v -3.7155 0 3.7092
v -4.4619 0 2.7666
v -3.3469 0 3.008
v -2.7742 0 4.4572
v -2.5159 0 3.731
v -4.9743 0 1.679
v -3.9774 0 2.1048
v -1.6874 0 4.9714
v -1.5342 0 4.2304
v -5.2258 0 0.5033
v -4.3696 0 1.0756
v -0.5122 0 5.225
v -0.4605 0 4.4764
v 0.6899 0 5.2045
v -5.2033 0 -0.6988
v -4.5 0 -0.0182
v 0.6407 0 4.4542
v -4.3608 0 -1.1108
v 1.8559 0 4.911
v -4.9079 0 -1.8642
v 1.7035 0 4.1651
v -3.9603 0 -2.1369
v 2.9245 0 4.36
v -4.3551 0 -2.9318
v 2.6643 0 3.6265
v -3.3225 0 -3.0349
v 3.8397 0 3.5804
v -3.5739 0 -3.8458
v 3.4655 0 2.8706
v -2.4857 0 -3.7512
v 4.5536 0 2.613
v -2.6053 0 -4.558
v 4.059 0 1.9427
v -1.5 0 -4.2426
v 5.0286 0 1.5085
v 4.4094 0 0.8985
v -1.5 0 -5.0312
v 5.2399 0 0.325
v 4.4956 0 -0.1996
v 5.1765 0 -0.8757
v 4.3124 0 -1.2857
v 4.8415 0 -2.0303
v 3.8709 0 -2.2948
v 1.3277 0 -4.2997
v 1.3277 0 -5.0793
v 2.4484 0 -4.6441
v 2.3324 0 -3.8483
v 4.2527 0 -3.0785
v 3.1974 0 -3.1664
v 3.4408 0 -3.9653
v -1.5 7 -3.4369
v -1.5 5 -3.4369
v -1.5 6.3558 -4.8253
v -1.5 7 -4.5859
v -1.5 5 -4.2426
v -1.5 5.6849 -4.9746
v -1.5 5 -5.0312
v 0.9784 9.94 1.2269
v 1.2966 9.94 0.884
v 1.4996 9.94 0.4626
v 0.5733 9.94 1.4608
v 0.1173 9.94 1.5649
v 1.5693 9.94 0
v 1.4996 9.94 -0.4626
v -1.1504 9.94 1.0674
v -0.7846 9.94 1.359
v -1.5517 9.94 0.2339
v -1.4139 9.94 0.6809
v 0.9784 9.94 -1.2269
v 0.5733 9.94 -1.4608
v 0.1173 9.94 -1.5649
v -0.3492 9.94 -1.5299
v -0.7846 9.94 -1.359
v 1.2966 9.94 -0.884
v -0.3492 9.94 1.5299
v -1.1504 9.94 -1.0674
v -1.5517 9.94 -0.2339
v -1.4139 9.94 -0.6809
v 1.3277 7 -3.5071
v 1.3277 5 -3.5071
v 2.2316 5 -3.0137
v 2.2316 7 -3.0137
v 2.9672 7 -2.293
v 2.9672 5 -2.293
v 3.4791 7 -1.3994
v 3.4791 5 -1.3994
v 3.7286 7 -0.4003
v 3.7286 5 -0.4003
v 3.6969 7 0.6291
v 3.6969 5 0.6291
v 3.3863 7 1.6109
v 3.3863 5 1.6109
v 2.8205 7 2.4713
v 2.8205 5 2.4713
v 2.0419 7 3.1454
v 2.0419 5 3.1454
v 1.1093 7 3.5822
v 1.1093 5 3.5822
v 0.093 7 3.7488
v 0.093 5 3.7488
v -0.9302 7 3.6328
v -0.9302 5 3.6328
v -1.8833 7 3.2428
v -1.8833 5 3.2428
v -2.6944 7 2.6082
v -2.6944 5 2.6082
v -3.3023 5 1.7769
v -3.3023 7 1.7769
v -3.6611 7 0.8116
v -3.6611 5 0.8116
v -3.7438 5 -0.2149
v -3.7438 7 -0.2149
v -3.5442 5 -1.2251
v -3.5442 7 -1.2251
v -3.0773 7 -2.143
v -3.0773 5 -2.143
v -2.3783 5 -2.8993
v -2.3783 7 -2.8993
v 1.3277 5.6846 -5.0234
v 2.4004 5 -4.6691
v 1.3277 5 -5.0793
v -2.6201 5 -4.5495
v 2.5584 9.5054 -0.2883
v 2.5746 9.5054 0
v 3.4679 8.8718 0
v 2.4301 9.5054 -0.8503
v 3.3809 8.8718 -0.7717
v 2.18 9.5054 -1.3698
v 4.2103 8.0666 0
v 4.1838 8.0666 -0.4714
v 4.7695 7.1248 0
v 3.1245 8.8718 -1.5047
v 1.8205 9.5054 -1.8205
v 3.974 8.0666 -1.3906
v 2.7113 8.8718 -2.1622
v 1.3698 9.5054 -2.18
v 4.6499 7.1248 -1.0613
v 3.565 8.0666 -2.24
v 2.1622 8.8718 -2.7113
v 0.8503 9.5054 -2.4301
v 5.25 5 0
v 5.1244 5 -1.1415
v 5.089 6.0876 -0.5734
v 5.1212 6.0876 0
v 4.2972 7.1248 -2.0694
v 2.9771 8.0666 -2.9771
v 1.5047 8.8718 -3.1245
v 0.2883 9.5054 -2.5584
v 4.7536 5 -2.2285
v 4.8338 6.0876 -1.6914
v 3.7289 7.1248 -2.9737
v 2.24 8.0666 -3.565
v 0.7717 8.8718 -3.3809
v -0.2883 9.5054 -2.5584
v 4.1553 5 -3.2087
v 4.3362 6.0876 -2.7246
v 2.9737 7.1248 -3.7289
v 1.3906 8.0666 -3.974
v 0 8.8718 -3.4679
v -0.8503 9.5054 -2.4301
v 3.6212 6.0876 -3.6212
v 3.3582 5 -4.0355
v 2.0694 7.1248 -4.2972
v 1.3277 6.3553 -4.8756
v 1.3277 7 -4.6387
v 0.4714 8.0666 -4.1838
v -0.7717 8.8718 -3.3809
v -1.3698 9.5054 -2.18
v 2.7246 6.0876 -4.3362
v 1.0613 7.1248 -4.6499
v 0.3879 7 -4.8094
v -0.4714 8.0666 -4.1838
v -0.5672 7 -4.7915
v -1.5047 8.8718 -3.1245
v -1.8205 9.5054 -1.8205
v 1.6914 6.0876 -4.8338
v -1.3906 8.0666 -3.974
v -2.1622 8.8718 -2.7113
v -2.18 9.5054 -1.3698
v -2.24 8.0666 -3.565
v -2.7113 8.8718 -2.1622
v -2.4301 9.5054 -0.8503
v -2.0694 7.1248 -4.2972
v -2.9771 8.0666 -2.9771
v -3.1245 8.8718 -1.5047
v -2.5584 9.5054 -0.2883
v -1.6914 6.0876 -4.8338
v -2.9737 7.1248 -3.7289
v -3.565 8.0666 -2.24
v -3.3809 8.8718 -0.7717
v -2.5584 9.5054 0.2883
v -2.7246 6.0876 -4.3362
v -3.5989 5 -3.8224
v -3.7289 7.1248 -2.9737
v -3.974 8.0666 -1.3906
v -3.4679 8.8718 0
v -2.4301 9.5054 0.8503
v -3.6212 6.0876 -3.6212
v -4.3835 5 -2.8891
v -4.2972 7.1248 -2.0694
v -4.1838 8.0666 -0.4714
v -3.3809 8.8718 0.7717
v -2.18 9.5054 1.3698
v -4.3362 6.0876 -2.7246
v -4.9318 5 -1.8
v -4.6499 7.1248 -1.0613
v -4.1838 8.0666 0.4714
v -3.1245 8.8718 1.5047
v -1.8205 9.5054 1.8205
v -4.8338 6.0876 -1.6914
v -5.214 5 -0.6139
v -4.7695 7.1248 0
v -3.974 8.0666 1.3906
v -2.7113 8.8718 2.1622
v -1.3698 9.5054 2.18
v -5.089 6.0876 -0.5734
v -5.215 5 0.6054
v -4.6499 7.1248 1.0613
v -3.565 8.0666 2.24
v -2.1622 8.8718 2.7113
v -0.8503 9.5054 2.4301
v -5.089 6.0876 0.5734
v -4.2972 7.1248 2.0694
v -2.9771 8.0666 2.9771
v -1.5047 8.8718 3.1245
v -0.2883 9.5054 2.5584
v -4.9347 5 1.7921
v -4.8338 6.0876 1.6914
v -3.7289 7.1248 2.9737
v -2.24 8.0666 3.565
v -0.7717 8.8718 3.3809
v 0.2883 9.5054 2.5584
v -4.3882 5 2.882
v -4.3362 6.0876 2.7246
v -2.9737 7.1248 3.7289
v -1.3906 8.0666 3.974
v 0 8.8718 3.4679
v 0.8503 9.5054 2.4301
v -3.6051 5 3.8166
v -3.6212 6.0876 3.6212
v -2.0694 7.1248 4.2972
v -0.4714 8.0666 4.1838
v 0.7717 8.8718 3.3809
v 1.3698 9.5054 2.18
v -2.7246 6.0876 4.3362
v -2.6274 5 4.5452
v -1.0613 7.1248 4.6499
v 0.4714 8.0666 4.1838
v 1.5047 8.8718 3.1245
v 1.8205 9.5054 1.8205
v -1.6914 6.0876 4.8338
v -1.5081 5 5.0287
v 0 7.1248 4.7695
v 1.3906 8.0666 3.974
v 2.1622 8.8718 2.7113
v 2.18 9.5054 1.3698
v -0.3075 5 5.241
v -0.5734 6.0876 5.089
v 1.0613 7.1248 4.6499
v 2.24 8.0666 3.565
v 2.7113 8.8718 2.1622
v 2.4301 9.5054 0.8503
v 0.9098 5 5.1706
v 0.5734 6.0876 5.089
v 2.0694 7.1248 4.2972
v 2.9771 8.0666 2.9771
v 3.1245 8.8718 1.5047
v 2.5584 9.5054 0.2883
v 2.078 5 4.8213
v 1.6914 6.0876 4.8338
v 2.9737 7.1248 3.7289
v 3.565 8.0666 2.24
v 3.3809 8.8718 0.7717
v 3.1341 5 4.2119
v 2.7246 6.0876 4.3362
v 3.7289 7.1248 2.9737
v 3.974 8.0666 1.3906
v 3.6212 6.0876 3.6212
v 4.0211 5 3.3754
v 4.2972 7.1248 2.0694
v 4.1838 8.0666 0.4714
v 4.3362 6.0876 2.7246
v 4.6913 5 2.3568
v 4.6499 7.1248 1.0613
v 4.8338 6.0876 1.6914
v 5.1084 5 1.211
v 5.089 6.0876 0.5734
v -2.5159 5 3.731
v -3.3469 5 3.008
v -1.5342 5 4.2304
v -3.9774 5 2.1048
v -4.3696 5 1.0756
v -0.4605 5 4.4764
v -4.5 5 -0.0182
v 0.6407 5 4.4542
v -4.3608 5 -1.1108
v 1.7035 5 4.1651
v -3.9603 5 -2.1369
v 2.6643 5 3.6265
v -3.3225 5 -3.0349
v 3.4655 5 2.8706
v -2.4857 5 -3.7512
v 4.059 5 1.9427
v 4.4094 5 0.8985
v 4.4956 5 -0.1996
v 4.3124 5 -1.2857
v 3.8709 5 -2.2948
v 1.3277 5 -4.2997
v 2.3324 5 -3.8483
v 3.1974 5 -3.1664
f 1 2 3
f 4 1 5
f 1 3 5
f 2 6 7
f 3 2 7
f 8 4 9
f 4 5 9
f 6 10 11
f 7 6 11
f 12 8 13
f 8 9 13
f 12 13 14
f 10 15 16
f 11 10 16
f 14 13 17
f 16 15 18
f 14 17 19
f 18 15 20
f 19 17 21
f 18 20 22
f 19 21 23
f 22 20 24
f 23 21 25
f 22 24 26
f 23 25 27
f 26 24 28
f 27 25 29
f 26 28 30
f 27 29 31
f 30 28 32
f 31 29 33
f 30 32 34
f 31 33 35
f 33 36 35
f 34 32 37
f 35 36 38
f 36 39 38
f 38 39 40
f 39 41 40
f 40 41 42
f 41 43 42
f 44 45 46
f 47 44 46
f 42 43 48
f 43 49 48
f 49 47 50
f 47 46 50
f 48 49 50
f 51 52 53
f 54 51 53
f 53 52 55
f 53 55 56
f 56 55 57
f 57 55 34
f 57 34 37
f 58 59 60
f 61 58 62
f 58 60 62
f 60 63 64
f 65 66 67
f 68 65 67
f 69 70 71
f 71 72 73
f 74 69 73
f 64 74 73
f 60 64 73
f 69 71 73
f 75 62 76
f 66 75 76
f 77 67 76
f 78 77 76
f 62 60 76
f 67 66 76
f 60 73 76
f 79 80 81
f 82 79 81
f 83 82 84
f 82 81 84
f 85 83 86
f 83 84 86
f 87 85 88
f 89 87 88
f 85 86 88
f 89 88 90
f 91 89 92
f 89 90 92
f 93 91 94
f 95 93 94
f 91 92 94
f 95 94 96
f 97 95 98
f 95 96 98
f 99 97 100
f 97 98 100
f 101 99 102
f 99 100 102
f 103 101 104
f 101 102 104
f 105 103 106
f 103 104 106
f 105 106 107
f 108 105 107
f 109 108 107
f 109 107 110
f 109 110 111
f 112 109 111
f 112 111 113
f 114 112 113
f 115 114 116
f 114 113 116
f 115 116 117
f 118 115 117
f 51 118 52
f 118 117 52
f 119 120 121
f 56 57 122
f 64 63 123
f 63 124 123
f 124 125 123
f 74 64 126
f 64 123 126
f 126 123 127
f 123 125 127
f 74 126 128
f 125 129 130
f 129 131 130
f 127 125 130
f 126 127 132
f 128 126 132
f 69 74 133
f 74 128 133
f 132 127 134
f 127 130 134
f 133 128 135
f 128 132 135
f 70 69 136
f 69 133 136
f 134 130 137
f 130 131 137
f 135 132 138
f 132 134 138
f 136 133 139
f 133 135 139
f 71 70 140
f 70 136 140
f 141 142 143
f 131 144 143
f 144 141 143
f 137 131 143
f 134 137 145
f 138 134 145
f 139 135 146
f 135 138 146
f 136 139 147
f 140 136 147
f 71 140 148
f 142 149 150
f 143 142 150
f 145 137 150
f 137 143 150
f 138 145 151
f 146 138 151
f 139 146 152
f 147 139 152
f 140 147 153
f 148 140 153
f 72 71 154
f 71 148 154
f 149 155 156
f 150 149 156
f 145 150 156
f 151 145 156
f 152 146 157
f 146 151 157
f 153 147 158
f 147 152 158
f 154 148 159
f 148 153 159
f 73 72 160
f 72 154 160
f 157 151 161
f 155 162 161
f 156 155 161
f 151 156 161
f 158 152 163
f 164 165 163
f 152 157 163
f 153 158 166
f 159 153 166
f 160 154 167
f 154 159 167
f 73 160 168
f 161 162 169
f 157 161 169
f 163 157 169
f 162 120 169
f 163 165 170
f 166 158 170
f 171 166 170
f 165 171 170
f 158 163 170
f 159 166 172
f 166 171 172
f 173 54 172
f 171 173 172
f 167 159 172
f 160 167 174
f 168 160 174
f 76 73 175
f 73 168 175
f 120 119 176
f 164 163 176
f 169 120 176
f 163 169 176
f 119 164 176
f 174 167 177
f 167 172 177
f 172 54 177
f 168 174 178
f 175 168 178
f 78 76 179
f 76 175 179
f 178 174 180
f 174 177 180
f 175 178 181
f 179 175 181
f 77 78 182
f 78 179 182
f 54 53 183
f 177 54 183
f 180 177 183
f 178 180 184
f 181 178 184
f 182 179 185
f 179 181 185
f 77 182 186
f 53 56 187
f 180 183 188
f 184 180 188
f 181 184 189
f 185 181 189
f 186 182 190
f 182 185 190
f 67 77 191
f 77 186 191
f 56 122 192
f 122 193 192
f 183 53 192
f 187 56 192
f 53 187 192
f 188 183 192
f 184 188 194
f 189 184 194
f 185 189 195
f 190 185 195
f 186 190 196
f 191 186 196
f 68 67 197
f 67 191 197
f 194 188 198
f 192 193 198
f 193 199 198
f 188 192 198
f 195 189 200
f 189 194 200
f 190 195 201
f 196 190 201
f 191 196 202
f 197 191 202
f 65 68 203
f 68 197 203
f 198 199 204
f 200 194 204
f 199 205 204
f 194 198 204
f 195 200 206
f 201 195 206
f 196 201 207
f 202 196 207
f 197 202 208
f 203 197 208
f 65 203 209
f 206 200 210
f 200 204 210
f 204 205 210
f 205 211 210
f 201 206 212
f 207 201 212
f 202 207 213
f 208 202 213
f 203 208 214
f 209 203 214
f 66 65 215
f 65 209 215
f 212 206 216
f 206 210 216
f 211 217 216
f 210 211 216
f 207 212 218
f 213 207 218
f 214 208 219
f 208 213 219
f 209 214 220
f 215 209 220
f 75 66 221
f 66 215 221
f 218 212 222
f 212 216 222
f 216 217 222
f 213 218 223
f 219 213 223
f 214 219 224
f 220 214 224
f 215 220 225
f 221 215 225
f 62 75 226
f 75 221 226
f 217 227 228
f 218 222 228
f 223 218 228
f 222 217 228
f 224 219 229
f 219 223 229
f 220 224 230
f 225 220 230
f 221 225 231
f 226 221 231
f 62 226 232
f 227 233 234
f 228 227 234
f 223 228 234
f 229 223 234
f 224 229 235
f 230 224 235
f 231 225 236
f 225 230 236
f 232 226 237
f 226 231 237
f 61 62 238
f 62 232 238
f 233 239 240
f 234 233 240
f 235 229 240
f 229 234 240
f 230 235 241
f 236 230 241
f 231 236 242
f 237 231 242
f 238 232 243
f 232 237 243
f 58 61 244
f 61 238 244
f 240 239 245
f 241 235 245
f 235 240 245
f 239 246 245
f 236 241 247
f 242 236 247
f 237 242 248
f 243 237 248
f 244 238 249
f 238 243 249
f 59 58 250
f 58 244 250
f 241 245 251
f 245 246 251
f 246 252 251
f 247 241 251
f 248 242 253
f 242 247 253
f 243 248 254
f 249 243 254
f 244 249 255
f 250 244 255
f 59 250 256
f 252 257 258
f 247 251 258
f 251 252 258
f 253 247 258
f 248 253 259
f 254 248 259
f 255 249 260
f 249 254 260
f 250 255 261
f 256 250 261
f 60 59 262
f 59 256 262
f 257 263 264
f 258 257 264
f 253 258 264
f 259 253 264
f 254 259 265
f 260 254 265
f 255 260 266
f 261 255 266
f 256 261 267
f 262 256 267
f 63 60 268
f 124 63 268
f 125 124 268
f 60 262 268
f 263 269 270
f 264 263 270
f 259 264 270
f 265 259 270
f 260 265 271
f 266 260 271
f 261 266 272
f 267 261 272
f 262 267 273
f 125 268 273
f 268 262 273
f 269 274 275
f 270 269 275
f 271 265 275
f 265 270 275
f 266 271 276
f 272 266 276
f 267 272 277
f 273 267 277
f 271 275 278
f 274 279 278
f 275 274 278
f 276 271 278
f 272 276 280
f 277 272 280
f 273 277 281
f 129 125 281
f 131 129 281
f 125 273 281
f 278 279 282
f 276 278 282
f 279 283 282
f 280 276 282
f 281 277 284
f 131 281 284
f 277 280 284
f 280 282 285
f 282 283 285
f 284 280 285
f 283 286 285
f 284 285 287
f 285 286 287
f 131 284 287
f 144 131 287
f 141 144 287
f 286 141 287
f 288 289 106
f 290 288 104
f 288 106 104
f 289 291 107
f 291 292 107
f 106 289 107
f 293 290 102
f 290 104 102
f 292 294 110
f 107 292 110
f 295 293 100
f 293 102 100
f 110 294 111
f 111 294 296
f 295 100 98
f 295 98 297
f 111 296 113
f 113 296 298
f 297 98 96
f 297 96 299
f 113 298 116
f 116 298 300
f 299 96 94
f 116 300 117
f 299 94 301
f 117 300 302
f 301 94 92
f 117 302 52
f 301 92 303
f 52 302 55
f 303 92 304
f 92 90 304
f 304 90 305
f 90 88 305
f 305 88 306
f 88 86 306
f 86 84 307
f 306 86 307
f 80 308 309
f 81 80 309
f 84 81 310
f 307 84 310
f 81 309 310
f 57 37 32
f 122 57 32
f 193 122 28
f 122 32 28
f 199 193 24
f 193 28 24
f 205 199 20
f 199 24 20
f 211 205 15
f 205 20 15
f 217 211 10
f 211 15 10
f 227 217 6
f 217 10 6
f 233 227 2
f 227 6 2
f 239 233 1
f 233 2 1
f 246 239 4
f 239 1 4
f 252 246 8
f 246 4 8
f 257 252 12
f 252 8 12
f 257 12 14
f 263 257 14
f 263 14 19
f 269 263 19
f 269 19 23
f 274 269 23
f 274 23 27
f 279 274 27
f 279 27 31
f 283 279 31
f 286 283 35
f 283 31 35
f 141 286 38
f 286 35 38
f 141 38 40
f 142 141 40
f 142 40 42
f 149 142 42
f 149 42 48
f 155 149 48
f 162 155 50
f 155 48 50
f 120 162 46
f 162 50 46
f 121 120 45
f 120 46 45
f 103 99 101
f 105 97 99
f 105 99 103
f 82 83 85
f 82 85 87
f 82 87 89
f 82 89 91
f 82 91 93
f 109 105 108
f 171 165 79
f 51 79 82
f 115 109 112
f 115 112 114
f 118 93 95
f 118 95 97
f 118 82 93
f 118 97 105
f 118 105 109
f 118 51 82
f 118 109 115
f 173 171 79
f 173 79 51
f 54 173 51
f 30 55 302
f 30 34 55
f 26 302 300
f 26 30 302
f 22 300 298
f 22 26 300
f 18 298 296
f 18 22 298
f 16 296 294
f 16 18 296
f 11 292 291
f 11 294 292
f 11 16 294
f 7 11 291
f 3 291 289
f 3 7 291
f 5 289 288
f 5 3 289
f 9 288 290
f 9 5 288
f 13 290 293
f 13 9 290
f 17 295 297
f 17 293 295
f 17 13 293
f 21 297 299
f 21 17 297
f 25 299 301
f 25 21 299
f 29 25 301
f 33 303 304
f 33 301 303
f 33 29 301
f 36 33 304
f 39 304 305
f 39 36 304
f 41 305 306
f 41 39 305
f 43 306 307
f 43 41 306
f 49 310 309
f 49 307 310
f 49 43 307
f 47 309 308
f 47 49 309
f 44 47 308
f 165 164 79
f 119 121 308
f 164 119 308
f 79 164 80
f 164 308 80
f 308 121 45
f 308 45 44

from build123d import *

# Parameters (mm, degrees)
SKETCH1_R           = 5.25
SKETCH1_R_2         = 4.5
BOSS_EXTRUDE1_DEPTH = 5
CUT_EXTRUDE1_DEPTH  = 5
CUT_EXTRUDE2_DEPTH  = 2
SKETCH6_R           = 2
CUT_EXTRUDE4_DEPTH  = 0.35


with BuildPart() as part:
    # Sketch1 → Boss-Extrude1 (new body)
    with BuildSketch(Plane(origin=(0, 0, 0), x_dir=(1, 0, 0), z_dir=(0, 1, 0))):
        Circle(SKETCH1_R)
        Circle(SKETCH1_R_2, mode=Mode.SUBTRACT)
    extrude(amount=BOSS_EXTRUDE1_DEPTH)

    # Sketch2 → Cut-Extrude1 (cut)
    with BuildSketch(Plane(origin=(0, 0, 0), x_dir=(1, 0, 0), z_dir=(0, 1, 0))):
        Polygon((1.327689147, 3.795637322), (1.327689147, 5.701107087), (-1.5, 5.701107087), (-1.5, 3.701107087), align=None)
    extrude(amount=CUT_EXTRUDE1_DEPTH, mode=Mode.SUBTRACT)

    # Sketch4 → Revolve1 (revolve)
    with BuildSketch(Plane.XY):
        with BuildLine():
            Line((5.25, 5), (0, 5))
            Line((0, 5), (0, 10.18))
            ThreePointArc((0, 10.18), (3.687644912, 8.667004979), (5.25, 5))
        make_face()
    revolve(axis=Axis((0, 5, 0), (0, 1, 0)))

    # Sketch5 → Cut-Extrude2 (cut)
    with BuildSketch(Plane(origin=(0, 5, 0), x_dir=(-1, 0, 0), z_dir=(0, -1, 0))):
        with BuildLine():
            Line((1.5, 3.436931771), (1.5, 6))
            Line((1.5, 6), (-1.327689147, 6))
            Line((-1.327689147, 6), (-1.327689147, 3.507098734))
            ThreePointArc((-1.327689147, 3.507098734), (-0.093024772, -3.748846008), (1.5, 3.436931771))
        make_face()
    extrude(amount=-CUT_EXTRUDE2_DEPTH, mode=Mode.SUBTRACT)

    # Sketch6 → Cut-Extrude4 (cut)
    with BuildSketch(Plane(origin=(0, 10.29, 0), x_dir=(-1, 0, 0), z_dir=(0, -1, 0))):
        Circle(SKETCH6_R)
    extrude(amount=CUT_EXTRUDE4_DEPTH, mode=Mode.SUBTRACT)


solid = part.part
